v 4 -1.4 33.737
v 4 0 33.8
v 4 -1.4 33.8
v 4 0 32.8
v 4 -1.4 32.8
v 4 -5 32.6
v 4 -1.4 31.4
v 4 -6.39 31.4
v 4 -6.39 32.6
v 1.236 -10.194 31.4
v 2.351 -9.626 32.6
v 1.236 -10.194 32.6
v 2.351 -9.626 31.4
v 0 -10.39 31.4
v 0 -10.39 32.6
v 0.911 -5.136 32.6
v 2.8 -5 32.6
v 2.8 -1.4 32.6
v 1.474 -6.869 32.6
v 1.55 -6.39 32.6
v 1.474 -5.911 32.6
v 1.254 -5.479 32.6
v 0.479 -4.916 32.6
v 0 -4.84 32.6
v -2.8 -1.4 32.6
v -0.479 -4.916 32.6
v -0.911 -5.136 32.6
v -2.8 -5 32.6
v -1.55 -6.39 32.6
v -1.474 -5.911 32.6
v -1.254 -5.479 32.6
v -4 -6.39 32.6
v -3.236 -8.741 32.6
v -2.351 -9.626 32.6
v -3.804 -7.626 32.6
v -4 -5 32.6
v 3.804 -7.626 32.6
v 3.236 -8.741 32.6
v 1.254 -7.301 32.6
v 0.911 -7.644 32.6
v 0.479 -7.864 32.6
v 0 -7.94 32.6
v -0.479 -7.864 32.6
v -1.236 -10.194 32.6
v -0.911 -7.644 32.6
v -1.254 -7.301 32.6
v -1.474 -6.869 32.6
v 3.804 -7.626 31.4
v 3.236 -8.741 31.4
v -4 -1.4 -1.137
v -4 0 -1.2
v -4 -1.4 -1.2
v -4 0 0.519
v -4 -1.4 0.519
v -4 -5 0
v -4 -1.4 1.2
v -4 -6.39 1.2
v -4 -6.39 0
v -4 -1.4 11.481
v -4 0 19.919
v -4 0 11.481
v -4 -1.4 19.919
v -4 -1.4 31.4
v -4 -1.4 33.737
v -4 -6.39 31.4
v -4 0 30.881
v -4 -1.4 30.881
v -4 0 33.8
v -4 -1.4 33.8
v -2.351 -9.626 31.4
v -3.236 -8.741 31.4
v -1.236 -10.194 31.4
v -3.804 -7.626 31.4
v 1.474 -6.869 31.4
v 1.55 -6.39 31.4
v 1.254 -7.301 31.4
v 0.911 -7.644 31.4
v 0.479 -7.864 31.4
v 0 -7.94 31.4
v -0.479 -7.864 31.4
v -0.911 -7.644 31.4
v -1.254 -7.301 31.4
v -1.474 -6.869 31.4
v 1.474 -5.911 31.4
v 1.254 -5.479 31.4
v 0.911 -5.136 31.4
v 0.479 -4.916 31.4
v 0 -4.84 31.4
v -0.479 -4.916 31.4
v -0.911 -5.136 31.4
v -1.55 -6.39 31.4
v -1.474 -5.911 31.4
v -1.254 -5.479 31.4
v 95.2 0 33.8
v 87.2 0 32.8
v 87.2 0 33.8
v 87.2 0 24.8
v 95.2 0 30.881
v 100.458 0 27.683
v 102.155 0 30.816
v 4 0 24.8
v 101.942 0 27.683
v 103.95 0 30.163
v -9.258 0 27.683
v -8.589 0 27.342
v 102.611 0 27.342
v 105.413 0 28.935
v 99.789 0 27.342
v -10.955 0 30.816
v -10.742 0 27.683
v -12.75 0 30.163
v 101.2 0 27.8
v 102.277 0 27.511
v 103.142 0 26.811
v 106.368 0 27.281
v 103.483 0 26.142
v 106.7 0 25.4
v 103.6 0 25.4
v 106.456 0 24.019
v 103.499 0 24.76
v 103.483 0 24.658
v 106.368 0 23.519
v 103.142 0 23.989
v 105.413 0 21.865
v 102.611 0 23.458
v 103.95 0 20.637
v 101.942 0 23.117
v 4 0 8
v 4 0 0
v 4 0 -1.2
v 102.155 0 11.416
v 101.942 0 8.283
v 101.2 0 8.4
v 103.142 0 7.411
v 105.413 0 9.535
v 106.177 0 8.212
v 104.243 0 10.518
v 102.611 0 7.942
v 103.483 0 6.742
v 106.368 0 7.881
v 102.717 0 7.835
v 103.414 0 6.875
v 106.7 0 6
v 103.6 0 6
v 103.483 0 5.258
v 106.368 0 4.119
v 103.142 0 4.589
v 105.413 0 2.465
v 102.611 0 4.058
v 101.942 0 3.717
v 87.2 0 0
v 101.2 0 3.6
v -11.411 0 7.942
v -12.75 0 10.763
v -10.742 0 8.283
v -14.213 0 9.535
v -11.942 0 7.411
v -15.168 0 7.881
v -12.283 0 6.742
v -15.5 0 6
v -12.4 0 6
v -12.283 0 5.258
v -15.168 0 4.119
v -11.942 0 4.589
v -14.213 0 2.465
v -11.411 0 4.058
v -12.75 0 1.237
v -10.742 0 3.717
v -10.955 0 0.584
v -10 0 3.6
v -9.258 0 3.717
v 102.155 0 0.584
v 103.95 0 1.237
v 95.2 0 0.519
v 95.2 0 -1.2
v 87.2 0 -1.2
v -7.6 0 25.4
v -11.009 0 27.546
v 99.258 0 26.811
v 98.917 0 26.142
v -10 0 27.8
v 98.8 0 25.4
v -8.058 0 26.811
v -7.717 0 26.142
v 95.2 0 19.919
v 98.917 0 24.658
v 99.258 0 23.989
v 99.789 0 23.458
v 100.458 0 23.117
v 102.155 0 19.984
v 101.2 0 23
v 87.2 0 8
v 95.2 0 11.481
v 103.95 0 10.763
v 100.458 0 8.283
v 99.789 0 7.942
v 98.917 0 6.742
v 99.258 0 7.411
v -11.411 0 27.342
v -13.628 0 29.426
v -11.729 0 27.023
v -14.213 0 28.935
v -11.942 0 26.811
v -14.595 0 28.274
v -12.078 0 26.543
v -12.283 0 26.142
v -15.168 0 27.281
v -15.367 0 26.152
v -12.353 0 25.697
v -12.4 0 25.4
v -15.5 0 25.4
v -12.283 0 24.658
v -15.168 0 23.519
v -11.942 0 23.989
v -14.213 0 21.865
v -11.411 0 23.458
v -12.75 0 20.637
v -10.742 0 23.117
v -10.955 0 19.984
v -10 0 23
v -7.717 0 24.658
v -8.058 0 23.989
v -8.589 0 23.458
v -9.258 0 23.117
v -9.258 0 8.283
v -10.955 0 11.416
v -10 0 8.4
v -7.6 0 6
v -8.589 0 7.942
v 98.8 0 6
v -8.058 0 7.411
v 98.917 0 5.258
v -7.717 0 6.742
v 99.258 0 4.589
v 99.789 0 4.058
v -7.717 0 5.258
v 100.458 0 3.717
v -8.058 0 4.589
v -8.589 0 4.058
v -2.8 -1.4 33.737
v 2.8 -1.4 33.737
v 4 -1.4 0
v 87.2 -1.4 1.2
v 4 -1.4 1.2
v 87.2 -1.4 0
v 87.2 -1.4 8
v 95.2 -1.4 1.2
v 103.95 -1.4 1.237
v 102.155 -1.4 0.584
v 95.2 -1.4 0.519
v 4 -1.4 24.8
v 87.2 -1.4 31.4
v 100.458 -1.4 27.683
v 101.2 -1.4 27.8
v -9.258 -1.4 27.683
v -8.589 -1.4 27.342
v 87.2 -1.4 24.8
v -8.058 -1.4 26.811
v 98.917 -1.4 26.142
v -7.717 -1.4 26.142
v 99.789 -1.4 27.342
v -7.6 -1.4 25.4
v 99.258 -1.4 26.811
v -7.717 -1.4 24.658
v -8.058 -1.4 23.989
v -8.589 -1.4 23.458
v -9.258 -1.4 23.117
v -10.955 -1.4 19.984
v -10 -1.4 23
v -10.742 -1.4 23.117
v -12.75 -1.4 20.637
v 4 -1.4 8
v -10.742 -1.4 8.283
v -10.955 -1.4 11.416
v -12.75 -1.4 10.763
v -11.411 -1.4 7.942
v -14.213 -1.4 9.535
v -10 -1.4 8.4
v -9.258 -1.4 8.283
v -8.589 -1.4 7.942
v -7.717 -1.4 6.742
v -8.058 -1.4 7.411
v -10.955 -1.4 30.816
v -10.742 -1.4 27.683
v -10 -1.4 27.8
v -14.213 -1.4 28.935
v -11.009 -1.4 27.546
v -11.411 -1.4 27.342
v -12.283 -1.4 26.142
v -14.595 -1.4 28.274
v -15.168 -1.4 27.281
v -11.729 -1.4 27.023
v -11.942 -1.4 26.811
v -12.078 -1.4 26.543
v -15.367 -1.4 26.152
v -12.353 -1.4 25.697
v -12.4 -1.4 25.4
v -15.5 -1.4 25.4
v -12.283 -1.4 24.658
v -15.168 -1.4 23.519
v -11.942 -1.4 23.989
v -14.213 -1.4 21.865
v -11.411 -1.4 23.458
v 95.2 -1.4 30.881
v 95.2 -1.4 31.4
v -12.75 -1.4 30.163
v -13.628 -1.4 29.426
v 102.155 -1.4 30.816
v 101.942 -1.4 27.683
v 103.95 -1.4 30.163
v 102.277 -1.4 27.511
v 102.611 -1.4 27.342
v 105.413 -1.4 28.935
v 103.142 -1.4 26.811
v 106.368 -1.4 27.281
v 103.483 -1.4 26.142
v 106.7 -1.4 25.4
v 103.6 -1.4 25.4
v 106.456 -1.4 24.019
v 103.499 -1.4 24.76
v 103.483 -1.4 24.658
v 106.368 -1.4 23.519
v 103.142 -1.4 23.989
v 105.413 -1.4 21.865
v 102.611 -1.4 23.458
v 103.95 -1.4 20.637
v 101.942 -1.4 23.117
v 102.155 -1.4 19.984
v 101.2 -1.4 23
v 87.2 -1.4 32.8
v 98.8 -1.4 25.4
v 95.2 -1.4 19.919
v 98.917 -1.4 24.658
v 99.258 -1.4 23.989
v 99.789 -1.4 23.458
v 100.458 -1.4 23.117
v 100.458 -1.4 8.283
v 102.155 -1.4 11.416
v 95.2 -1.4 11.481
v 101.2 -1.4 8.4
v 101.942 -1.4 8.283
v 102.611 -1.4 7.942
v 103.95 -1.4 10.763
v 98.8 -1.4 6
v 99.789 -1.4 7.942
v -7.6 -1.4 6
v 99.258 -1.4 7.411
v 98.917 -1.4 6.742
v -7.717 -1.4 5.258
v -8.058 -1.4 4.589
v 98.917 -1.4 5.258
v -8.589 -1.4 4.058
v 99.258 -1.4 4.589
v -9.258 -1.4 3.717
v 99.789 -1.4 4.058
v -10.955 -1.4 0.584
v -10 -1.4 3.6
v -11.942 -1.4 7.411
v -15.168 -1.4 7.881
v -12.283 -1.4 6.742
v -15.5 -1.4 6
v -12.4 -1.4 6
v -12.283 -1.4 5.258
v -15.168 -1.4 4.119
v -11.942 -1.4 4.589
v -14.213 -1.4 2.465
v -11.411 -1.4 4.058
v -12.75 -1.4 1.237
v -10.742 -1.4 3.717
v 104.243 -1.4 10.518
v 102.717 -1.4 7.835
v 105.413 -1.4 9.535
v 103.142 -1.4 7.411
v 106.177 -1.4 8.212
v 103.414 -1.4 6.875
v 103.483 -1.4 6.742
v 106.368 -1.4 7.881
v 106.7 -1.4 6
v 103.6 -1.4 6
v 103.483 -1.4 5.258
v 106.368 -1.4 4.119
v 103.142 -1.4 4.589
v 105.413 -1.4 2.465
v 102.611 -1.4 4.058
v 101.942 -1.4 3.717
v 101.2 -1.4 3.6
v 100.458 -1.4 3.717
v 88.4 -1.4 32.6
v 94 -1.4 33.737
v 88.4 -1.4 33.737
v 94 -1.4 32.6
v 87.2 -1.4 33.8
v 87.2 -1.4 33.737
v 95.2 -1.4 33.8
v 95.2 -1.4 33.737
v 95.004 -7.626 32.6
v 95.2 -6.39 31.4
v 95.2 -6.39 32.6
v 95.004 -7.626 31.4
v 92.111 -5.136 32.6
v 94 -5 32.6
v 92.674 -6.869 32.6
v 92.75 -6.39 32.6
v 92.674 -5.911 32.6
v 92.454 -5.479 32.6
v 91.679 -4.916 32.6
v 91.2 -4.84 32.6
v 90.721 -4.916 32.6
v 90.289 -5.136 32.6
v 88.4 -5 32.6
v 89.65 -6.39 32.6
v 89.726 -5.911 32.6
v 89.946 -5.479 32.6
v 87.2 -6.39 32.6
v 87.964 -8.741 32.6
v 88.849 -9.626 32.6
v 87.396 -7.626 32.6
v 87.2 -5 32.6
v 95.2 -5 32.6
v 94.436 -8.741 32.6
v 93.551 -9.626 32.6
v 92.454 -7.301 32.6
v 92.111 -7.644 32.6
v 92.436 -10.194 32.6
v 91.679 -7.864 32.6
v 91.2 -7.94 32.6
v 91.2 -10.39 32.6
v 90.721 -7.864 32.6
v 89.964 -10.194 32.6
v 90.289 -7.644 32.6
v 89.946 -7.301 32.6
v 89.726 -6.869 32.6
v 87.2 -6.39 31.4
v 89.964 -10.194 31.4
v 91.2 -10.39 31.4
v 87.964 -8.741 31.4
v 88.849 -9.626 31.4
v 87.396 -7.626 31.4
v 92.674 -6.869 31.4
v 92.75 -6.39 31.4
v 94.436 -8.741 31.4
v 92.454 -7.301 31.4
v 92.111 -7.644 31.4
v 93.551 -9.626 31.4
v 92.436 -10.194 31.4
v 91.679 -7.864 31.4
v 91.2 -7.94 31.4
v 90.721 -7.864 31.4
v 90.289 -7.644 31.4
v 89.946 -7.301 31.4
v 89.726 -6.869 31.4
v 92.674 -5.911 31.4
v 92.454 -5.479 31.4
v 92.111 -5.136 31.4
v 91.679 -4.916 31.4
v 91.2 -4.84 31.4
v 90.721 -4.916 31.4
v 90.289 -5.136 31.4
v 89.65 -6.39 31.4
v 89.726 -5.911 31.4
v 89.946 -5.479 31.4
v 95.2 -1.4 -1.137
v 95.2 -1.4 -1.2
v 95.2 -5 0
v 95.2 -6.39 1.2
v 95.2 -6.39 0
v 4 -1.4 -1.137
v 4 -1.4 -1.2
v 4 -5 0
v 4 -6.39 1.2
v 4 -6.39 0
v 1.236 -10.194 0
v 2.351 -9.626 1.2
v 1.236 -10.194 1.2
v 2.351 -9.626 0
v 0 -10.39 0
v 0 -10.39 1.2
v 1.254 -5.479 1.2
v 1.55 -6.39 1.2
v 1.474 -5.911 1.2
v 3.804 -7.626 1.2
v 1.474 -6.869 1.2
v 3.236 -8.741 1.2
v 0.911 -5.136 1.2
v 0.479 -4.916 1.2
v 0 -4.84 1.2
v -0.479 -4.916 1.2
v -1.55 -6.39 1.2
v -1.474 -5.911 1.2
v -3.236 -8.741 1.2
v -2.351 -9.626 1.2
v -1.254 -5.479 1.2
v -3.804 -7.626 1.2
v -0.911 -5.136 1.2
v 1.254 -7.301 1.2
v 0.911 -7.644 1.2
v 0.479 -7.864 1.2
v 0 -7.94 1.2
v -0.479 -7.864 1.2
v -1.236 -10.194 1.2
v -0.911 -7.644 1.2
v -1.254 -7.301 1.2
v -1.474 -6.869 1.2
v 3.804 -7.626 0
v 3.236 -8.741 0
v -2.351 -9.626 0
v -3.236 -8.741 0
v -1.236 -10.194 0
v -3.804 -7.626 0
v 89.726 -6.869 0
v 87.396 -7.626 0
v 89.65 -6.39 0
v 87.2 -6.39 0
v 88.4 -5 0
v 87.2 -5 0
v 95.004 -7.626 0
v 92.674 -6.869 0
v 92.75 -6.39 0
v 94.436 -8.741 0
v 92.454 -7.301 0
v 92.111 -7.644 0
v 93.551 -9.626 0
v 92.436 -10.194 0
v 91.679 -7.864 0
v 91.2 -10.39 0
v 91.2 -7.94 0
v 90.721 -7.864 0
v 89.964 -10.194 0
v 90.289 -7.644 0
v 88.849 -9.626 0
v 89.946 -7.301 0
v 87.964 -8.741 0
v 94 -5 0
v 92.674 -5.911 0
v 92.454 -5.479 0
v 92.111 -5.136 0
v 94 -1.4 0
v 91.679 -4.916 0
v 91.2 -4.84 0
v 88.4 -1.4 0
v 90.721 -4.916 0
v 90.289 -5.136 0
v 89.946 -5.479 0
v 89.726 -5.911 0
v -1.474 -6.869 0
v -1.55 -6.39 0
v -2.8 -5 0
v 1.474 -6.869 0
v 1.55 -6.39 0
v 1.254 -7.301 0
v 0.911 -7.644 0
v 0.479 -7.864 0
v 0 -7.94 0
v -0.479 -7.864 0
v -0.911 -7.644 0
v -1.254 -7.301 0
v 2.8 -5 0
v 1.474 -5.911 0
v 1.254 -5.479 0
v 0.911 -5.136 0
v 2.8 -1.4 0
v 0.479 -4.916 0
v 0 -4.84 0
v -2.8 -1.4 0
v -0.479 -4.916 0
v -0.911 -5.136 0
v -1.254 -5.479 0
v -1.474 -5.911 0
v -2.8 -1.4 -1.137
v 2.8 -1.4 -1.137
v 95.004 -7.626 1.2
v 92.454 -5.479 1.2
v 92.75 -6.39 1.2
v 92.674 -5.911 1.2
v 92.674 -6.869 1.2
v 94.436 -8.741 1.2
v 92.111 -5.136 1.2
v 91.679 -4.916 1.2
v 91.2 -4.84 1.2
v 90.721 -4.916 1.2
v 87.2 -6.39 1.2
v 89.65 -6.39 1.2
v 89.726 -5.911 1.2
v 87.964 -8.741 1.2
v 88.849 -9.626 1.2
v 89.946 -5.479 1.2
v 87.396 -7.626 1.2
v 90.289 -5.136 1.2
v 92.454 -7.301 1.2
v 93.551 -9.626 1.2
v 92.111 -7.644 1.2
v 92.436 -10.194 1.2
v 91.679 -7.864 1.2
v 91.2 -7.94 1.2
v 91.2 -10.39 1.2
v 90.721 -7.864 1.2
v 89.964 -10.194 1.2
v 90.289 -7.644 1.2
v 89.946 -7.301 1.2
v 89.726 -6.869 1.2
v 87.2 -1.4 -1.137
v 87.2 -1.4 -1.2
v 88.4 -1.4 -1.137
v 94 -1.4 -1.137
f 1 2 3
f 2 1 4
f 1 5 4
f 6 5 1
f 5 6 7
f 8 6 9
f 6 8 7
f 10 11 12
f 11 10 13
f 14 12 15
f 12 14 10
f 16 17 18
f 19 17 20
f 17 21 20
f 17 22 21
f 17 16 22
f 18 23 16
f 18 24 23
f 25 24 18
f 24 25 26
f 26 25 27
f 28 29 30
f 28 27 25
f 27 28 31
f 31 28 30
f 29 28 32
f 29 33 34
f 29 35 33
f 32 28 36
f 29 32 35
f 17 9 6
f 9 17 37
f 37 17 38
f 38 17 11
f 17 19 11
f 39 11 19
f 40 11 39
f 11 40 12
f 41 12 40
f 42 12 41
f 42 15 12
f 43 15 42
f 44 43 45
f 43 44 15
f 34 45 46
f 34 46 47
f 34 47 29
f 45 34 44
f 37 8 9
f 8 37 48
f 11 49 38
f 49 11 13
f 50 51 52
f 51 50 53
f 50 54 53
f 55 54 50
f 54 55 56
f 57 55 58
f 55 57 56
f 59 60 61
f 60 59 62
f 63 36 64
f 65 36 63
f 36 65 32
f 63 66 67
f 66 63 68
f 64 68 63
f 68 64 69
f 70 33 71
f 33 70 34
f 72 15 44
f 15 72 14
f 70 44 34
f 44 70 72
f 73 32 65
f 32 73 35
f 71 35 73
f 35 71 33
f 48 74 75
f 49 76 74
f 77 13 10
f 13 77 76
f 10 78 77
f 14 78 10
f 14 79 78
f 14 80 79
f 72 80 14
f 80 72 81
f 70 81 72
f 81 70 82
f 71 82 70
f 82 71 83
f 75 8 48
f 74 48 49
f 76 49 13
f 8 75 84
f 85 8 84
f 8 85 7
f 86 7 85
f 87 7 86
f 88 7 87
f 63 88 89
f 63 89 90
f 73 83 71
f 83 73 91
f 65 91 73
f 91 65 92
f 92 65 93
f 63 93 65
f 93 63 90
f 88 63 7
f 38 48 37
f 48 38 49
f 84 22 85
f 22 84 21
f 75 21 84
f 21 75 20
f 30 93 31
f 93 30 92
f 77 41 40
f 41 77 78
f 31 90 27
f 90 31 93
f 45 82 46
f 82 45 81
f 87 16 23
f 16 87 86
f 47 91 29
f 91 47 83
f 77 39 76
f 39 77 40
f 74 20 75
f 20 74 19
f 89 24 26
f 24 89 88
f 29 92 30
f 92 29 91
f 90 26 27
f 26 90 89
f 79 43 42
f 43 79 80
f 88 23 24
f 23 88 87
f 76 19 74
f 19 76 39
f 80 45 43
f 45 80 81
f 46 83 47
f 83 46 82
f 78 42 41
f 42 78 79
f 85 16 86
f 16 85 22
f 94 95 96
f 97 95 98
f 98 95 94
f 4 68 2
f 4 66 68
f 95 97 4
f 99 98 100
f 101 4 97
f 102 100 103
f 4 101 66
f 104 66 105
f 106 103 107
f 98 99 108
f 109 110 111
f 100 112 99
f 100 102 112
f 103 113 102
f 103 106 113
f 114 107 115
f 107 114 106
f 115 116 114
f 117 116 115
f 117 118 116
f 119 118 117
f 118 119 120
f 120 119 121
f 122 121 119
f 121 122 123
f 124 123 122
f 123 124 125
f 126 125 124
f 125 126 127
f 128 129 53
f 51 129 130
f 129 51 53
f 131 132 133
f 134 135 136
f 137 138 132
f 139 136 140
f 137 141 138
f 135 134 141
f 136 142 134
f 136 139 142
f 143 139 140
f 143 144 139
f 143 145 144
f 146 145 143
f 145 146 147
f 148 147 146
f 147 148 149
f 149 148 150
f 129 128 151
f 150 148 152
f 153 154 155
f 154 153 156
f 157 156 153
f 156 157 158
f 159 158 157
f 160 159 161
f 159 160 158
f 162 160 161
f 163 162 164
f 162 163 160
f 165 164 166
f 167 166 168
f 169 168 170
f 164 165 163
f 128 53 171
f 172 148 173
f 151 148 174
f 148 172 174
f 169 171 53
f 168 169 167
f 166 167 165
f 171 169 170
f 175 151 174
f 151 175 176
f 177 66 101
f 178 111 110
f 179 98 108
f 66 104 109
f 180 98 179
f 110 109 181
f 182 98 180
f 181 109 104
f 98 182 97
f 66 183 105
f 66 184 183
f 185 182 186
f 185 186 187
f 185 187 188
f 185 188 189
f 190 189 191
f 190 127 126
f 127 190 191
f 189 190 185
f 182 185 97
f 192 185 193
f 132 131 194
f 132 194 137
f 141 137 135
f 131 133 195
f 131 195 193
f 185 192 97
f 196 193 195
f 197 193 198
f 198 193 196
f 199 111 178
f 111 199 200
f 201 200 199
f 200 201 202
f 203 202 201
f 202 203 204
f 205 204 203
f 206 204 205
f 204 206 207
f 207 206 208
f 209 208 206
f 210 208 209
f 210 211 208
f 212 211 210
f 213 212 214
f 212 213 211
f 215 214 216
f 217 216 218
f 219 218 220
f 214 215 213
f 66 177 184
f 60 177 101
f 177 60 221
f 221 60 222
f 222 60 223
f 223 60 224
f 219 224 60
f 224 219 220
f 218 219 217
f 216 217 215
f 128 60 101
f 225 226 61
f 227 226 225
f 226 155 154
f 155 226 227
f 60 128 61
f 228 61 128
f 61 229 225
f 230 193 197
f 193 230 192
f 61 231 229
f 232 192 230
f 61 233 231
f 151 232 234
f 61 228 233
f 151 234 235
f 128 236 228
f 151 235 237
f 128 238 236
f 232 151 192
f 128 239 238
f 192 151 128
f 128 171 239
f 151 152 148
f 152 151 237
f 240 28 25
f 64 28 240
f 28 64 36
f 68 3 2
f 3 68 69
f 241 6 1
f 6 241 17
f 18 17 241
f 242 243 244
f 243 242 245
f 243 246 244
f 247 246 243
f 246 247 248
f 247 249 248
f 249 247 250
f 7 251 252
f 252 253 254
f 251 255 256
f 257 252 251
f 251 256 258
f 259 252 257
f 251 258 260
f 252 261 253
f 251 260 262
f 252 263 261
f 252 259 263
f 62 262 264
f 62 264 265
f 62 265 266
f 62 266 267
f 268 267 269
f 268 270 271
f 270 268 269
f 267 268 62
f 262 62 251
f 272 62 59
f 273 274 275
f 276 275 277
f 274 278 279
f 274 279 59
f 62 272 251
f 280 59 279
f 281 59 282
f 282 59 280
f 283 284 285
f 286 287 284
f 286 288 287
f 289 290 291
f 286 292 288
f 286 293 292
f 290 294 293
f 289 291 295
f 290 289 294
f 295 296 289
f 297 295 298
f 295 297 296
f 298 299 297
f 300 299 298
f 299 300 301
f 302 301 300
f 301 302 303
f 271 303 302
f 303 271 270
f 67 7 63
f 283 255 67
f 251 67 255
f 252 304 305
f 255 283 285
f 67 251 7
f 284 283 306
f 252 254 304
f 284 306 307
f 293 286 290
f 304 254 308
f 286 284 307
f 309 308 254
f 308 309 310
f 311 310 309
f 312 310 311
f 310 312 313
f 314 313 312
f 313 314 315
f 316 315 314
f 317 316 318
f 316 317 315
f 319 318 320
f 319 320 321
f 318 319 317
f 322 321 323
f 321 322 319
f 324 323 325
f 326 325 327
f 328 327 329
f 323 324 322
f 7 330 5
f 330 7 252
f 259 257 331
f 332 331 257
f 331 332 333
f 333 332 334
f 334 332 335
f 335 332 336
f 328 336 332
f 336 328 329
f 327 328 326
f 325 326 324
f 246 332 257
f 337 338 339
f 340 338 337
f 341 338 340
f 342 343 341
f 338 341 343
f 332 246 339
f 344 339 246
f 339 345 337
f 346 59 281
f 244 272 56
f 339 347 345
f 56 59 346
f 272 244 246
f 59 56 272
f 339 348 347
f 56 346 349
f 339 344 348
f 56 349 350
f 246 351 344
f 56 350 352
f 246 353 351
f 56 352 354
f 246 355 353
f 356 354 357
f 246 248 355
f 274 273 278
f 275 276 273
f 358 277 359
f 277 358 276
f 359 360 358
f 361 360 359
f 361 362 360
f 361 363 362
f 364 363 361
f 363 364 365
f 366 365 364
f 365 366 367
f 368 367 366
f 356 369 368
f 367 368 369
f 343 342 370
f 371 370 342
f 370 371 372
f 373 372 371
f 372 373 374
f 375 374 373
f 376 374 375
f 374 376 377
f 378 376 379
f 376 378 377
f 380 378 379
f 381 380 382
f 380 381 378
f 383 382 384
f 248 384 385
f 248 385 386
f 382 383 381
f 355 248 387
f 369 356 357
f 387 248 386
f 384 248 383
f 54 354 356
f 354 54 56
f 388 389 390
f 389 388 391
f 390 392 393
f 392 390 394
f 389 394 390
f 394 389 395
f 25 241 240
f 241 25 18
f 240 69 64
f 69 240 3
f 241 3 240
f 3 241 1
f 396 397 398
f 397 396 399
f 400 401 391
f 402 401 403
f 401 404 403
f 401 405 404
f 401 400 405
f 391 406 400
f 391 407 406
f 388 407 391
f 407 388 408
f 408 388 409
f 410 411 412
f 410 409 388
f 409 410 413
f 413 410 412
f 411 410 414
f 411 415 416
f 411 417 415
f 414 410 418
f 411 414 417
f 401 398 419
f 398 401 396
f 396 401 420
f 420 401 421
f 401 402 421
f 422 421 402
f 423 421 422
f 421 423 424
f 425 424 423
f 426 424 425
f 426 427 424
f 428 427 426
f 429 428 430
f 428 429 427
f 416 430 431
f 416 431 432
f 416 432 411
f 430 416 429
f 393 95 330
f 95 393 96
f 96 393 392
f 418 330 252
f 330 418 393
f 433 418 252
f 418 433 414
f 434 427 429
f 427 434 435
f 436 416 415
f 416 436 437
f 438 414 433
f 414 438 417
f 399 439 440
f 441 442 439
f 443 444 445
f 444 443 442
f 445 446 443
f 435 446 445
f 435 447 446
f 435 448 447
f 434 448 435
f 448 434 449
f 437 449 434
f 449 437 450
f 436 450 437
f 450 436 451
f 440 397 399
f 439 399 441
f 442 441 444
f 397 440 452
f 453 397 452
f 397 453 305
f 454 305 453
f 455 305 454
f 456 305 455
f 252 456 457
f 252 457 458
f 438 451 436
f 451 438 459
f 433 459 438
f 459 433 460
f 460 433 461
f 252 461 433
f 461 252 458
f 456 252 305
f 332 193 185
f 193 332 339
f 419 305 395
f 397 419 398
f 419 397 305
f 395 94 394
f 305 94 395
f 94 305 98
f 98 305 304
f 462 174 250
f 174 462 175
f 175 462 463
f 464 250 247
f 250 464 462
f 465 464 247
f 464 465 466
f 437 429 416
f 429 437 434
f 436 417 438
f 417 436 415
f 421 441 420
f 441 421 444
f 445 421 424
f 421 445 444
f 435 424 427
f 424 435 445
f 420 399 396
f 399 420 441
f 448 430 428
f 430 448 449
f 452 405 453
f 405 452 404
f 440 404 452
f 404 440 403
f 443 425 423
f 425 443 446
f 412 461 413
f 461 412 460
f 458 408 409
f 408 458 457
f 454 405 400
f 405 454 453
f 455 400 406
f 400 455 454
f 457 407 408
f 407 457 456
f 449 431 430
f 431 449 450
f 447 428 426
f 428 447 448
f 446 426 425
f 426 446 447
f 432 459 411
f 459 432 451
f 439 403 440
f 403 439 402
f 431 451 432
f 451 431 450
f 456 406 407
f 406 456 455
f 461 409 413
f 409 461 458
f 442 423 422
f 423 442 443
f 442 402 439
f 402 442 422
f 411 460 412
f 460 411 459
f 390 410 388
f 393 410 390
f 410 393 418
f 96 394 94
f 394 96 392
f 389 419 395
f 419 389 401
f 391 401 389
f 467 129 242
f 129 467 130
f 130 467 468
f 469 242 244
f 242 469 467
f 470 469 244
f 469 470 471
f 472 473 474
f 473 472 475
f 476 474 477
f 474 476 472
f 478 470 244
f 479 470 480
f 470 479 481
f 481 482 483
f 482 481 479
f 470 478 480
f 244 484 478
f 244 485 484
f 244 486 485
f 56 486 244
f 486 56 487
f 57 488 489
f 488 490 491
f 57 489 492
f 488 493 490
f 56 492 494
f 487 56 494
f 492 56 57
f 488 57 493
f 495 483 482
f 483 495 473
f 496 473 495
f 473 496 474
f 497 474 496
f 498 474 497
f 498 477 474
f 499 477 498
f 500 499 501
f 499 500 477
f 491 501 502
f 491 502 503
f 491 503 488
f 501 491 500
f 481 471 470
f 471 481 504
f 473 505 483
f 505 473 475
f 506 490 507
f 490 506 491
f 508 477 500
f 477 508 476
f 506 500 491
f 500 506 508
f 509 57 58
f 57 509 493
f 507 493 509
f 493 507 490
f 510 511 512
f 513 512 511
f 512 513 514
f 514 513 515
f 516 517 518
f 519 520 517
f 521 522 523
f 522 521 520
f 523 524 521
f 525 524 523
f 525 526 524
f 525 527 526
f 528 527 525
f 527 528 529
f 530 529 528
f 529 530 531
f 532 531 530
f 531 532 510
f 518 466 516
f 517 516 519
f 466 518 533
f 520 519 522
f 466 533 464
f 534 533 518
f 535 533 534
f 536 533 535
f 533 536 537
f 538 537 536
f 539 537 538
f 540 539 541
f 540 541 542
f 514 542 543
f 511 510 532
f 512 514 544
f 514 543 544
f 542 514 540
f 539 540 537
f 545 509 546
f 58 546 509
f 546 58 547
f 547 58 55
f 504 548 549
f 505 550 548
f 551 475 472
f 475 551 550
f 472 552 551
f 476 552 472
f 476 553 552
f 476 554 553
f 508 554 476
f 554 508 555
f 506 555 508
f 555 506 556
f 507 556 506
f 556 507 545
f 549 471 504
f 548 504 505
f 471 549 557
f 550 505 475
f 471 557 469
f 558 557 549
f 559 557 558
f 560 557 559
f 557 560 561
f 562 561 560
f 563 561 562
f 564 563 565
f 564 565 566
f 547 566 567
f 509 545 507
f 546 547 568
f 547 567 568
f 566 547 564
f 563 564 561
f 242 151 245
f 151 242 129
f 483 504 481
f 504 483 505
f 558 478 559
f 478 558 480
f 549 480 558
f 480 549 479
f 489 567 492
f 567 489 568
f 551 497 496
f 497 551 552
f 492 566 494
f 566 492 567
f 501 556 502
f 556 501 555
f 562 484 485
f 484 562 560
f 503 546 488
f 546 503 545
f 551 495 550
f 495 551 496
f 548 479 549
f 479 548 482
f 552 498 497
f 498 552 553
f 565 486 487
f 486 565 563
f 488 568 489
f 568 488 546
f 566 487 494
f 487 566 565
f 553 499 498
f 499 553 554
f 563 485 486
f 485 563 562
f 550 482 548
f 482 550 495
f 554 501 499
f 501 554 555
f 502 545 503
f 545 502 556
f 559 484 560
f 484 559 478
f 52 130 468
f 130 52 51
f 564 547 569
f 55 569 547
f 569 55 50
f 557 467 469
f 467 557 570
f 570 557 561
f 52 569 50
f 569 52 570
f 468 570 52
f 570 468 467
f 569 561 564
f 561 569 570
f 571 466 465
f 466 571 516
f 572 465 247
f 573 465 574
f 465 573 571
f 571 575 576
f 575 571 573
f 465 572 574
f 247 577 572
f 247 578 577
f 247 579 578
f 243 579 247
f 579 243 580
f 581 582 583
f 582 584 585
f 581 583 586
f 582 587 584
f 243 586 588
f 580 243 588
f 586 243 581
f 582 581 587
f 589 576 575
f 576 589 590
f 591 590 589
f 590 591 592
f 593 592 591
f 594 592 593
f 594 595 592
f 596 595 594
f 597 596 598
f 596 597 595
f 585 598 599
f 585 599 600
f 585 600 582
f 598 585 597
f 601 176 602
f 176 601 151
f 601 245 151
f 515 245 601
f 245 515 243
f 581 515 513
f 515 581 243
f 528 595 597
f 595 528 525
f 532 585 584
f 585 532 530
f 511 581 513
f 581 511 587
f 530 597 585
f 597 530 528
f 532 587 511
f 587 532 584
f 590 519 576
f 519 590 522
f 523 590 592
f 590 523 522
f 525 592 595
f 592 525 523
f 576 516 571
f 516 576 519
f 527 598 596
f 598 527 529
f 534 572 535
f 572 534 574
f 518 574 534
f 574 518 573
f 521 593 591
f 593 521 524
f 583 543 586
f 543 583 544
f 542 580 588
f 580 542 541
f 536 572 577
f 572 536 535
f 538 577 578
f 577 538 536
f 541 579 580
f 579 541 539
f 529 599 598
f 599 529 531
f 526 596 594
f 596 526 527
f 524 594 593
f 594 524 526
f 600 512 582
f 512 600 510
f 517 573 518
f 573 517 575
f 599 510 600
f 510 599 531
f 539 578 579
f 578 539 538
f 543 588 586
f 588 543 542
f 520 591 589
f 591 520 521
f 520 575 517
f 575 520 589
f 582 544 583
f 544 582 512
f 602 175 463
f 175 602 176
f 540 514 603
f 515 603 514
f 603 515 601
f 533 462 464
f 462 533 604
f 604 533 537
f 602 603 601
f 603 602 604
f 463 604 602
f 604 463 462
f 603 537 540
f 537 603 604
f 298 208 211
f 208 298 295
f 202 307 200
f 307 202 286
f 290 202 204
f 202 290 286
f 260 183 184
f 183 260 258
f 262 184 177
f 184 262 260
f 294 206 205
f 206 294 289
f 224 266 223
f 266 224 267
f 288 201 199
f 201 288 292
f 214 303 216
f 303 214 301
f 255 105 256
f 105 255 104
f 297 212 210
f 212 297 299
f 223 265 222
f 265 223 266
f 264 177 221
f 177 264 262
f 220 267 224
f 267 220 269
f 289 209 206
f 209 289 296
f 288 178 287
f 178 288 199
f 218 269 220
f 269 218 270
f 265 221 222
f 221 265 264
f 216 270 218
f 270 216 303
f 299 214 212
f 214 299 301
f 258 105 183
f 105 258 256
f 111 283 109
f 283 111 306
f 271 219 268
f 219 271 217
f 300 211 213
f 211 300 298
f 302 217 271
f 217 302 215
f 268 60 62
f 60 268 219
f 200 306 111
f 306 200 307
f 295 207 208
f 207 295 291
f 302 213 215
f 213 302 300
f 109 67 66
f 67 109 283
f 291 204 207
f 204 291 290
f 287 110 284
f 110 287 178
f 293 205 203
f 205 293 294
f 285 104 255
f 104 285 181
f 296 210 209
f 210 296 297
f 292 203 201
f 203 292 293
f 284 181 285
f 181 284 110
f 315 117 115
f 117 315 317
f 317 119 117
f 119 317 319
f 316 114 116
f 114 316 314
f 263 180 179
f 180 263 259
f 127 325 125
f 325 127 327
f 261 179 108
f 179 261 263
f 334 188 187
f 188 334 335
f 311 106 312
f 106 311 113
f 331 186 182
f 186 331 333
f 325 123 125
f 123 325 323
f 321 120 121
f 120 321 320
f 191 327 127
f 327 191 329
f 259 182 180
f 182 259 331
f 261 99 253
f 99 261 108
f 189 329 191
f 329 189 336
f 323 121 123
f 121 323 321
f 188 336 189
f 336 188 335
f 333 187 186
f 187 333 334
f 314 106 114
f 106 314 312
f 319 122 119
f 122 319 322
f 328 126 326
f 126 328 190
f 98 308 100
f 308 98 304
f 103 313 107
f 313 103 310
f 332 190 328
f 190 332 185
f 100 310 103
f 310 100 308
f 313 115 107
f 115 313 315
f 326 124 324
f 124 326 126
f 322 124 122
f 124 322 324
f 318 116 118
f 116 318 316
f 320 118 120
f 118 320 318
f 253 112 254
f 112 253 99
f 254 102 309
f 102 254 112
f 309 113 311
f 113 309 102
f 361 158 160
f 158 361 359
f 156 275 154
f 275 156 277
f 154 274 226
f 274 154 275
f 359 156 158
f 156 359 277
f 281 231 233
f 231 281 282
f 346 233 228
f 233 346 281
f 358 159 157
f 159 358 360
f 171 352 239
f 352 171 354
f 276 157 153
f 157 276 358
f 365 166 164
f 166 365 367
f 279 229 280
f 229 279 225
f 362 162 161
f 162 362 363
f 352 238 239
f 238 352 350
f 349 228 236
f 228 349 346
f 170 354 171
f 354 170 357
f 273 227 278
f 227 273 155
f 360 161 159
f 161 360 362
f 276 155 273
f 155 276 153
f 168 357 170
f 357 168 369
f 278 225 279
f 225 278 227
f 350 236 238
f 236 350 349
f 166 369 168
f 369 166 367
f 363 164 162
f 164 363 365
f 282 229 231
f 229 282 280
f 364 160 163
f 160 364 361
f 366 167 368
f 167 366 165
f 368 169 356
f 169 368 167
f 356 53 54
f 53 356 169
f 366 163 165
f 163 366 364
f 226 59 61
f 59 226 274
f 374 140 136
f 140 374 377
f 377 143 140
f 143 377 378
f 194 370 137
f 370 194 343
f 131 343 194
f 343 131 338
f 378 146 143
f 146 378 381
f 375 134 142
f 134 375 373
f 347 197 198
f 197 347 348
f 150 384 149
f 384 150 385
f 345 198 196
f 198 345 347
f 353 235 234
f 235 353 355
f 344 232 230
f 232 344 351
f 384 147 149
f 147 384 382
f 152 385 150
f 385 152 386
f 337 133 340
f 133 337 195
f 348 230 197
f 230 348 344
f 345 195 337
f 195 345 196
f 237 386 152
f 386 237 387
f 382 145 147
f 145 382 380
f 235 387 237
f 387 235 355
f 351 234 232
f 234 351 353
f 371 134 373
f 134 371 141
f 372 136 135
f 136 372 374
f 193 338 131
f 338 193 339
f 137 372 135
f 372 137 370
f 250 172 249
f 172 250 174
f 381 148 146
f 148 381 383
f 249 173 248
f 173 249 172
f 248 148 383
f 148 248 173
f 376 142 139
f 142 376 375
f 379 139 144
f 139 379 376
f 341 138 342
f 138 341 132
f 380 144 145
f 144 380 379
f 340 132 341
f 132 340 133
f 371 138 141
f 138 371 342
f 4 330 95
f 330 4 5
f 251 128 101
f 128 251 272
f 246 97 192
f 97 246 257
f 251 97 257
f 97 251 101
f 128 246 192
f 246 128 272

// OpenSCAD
// Mount an old Rapsberry Pi in Wooden casing to the wall

// Some material definitions
// defaults in prusa slicer 0.15 height (0.2 first layer)
layer_1=0.2;
layer_n=0.15;
base_h=layer_1+layer_n*8; // 1.4

// Some wood casing definitions
screws_apart_dist=94.3-3.1;
screws_disp=5; // this includes a little spacing between
               // the bracket and side wall of the case
casing_h=30;
m3_d=3.1; //screw hole

// Some more for the mounting bracket
combined_h=casing_h+base_h;

// Some helper modules

module washer() {
    difference() {
        cylinder(h=base_h,d=11);
        //screw_countersunk();
        raised_head_screw();
    }
}
*washer();

// model countersunk screw for 3d printing
// useful for creating attachement bores
// which fit these screws
// default values are for 3mm x 20mm screw with 6mm head (3.2mm bore for tolerance)
module screw_countersunk(
        z  = base_h, //displacement z
        l  = 22,     //length
        dh =  7.3,   //head dia
        db =  3.3,   //base dia (smaller icw ds)
        lh =  2.2,   //head length
        ds =  3.9,   //shaft dia
        )
{
    translate([0,0,z-lh+0.01])
        cylinder(h=lh, r1=db/2, r2=dh/2, $fn=20);
    translate([0,0,z-lh+0.02-l])
        cylinder(h=l, d=ds, $fn=20);
}
*screw_countersunk();

module raised_head_screw(
    z  = base_h, // displacement z
    l  = 22,     // length
    ds = 4.8     // shaft dia
){
    translate([0,0,0.01-l])
        cylinder(h=l+z+0.02, d=ds, $fn=20);
}

// a frame part will simply draw a connection between two
// mounting positions. 
module mount_frame_part(
    m1, m2,
    bottom_support = true,
    d1 = m3_d,   // screw hole m3 diameter
    d3 = 8,      // frame width
    height = 1.2 // nozzle is 0.4 -> so 3 perimeters
) {
    translate([0,-base_h+0.01,0])
    difference() {
        hull() {
            // mount 1
            translate(m1)
                cylinder(h=height,d=d3, $fn=20);
            // mount 2 = base mount
            translate(m2) translate([-d3/2,0])
                cube([d3,height,height]);
        }
        // drill hole at m1
        translate([0,0,-0.01]) {
            translate(m1)
                cylinder(h=height+0.8, d=d1, $fn=20);
        }
    }
    support_z= bottom_support ? -height : 0;
    hull() {
        translate(m1) translate([-d3/2,0])
            cube([height,height,height]);
        translate(m2) translate([-d3/2,-height,support_z])
            cube([height,height,height*2]);            
    }
    hull() {
        translate(m1) translate([d3/2-height,0])
            cube([height,height,height]);
        translate(m2) translate([d3/2-height,-height,support_z])
            cube([height,height,height*2]);            
    }
    support_z2= bottom_support ? -height : height;
    translate(m2) translate([-d3/2,-base_h,support_z2])
        cube([d3,base_h,height]);
}

module rear_frame_part(
    m1, m2,
    d3 = 8 // frame width
) {
    z1 = (m1.z > 0) ? m1.z-d3+base_h : m1.z;
    z2 = (m2.z > 0) ? m2.z-d3+base_h : m2.z;
    let(m1=[m1.x,m1.y,z1], m2=[m2.x,m2.y,z2]) {
        translate([-d3/2,-base_h,0]) hull() {
            translate(m1)
              cube([d3,base_h,d3]);
            translate(m2)
              cube([d3,base_h,d3]);
        }
    }
}

module rear_mount(
    point, rel,
    d3 = 4,  // frame width
    d4 = 11 // washer diameter
) {
    translate(point)
      translate(rel)
      rotate([90,0,0])
      washer();
    difference() {  
        hull() {
            translate(point)
                translate([-d3/2,-base_h,rel.z-d4/2])
                cube([d3,base_h,d4]);
            translate(point)
                translate(rel)
                rotate([90,0,0])
                cylinder(h=base_h,d=d4);
        }
        translate(point)
            translate(rel)
            rotate([90,0,0])
            raised_head_screw();
    }   
}


//
// 3D locations
// 

topleft_base=[0,0,combined_h];
topleft=[0,-screws_disp,combined_h];
topright_base=[screws_apart_dist,0,combined_h];
topright=[screws_apart_dist,-screws_disp,combined_h];

botleft_base=[0,0,0];
botleft=[0,-screws_disp,0];
botright_base=[screws_apart_dist,0,0];
botright=[screws_apart_dist,-screws_disp,0];

// connection with the casing
mount_frame_part(topleft,topleft_base,false);
mount_frame_part(topright,topright_base,false);
mount_frame_part(botleft,botleft_base);
mount_frame_part(botright,botright_base);

// rear frame
rear_frame_part(topleft_base,botleft_base);
rear_frame_part(topright_base,botright_base);
rear_frame_part(topleft_base,topright_base);
rear_frame_part(botleft_base,botright_base);

// mounting agains the wall
rear_mount(topleft_base,[-10,0,-6]);
rear_mount(topright_base,[+10,0,-6]);
rear_mount(botleft_base,[-10,0,+6]);
rear_mount(botright_base,[+10,0,+6]);
